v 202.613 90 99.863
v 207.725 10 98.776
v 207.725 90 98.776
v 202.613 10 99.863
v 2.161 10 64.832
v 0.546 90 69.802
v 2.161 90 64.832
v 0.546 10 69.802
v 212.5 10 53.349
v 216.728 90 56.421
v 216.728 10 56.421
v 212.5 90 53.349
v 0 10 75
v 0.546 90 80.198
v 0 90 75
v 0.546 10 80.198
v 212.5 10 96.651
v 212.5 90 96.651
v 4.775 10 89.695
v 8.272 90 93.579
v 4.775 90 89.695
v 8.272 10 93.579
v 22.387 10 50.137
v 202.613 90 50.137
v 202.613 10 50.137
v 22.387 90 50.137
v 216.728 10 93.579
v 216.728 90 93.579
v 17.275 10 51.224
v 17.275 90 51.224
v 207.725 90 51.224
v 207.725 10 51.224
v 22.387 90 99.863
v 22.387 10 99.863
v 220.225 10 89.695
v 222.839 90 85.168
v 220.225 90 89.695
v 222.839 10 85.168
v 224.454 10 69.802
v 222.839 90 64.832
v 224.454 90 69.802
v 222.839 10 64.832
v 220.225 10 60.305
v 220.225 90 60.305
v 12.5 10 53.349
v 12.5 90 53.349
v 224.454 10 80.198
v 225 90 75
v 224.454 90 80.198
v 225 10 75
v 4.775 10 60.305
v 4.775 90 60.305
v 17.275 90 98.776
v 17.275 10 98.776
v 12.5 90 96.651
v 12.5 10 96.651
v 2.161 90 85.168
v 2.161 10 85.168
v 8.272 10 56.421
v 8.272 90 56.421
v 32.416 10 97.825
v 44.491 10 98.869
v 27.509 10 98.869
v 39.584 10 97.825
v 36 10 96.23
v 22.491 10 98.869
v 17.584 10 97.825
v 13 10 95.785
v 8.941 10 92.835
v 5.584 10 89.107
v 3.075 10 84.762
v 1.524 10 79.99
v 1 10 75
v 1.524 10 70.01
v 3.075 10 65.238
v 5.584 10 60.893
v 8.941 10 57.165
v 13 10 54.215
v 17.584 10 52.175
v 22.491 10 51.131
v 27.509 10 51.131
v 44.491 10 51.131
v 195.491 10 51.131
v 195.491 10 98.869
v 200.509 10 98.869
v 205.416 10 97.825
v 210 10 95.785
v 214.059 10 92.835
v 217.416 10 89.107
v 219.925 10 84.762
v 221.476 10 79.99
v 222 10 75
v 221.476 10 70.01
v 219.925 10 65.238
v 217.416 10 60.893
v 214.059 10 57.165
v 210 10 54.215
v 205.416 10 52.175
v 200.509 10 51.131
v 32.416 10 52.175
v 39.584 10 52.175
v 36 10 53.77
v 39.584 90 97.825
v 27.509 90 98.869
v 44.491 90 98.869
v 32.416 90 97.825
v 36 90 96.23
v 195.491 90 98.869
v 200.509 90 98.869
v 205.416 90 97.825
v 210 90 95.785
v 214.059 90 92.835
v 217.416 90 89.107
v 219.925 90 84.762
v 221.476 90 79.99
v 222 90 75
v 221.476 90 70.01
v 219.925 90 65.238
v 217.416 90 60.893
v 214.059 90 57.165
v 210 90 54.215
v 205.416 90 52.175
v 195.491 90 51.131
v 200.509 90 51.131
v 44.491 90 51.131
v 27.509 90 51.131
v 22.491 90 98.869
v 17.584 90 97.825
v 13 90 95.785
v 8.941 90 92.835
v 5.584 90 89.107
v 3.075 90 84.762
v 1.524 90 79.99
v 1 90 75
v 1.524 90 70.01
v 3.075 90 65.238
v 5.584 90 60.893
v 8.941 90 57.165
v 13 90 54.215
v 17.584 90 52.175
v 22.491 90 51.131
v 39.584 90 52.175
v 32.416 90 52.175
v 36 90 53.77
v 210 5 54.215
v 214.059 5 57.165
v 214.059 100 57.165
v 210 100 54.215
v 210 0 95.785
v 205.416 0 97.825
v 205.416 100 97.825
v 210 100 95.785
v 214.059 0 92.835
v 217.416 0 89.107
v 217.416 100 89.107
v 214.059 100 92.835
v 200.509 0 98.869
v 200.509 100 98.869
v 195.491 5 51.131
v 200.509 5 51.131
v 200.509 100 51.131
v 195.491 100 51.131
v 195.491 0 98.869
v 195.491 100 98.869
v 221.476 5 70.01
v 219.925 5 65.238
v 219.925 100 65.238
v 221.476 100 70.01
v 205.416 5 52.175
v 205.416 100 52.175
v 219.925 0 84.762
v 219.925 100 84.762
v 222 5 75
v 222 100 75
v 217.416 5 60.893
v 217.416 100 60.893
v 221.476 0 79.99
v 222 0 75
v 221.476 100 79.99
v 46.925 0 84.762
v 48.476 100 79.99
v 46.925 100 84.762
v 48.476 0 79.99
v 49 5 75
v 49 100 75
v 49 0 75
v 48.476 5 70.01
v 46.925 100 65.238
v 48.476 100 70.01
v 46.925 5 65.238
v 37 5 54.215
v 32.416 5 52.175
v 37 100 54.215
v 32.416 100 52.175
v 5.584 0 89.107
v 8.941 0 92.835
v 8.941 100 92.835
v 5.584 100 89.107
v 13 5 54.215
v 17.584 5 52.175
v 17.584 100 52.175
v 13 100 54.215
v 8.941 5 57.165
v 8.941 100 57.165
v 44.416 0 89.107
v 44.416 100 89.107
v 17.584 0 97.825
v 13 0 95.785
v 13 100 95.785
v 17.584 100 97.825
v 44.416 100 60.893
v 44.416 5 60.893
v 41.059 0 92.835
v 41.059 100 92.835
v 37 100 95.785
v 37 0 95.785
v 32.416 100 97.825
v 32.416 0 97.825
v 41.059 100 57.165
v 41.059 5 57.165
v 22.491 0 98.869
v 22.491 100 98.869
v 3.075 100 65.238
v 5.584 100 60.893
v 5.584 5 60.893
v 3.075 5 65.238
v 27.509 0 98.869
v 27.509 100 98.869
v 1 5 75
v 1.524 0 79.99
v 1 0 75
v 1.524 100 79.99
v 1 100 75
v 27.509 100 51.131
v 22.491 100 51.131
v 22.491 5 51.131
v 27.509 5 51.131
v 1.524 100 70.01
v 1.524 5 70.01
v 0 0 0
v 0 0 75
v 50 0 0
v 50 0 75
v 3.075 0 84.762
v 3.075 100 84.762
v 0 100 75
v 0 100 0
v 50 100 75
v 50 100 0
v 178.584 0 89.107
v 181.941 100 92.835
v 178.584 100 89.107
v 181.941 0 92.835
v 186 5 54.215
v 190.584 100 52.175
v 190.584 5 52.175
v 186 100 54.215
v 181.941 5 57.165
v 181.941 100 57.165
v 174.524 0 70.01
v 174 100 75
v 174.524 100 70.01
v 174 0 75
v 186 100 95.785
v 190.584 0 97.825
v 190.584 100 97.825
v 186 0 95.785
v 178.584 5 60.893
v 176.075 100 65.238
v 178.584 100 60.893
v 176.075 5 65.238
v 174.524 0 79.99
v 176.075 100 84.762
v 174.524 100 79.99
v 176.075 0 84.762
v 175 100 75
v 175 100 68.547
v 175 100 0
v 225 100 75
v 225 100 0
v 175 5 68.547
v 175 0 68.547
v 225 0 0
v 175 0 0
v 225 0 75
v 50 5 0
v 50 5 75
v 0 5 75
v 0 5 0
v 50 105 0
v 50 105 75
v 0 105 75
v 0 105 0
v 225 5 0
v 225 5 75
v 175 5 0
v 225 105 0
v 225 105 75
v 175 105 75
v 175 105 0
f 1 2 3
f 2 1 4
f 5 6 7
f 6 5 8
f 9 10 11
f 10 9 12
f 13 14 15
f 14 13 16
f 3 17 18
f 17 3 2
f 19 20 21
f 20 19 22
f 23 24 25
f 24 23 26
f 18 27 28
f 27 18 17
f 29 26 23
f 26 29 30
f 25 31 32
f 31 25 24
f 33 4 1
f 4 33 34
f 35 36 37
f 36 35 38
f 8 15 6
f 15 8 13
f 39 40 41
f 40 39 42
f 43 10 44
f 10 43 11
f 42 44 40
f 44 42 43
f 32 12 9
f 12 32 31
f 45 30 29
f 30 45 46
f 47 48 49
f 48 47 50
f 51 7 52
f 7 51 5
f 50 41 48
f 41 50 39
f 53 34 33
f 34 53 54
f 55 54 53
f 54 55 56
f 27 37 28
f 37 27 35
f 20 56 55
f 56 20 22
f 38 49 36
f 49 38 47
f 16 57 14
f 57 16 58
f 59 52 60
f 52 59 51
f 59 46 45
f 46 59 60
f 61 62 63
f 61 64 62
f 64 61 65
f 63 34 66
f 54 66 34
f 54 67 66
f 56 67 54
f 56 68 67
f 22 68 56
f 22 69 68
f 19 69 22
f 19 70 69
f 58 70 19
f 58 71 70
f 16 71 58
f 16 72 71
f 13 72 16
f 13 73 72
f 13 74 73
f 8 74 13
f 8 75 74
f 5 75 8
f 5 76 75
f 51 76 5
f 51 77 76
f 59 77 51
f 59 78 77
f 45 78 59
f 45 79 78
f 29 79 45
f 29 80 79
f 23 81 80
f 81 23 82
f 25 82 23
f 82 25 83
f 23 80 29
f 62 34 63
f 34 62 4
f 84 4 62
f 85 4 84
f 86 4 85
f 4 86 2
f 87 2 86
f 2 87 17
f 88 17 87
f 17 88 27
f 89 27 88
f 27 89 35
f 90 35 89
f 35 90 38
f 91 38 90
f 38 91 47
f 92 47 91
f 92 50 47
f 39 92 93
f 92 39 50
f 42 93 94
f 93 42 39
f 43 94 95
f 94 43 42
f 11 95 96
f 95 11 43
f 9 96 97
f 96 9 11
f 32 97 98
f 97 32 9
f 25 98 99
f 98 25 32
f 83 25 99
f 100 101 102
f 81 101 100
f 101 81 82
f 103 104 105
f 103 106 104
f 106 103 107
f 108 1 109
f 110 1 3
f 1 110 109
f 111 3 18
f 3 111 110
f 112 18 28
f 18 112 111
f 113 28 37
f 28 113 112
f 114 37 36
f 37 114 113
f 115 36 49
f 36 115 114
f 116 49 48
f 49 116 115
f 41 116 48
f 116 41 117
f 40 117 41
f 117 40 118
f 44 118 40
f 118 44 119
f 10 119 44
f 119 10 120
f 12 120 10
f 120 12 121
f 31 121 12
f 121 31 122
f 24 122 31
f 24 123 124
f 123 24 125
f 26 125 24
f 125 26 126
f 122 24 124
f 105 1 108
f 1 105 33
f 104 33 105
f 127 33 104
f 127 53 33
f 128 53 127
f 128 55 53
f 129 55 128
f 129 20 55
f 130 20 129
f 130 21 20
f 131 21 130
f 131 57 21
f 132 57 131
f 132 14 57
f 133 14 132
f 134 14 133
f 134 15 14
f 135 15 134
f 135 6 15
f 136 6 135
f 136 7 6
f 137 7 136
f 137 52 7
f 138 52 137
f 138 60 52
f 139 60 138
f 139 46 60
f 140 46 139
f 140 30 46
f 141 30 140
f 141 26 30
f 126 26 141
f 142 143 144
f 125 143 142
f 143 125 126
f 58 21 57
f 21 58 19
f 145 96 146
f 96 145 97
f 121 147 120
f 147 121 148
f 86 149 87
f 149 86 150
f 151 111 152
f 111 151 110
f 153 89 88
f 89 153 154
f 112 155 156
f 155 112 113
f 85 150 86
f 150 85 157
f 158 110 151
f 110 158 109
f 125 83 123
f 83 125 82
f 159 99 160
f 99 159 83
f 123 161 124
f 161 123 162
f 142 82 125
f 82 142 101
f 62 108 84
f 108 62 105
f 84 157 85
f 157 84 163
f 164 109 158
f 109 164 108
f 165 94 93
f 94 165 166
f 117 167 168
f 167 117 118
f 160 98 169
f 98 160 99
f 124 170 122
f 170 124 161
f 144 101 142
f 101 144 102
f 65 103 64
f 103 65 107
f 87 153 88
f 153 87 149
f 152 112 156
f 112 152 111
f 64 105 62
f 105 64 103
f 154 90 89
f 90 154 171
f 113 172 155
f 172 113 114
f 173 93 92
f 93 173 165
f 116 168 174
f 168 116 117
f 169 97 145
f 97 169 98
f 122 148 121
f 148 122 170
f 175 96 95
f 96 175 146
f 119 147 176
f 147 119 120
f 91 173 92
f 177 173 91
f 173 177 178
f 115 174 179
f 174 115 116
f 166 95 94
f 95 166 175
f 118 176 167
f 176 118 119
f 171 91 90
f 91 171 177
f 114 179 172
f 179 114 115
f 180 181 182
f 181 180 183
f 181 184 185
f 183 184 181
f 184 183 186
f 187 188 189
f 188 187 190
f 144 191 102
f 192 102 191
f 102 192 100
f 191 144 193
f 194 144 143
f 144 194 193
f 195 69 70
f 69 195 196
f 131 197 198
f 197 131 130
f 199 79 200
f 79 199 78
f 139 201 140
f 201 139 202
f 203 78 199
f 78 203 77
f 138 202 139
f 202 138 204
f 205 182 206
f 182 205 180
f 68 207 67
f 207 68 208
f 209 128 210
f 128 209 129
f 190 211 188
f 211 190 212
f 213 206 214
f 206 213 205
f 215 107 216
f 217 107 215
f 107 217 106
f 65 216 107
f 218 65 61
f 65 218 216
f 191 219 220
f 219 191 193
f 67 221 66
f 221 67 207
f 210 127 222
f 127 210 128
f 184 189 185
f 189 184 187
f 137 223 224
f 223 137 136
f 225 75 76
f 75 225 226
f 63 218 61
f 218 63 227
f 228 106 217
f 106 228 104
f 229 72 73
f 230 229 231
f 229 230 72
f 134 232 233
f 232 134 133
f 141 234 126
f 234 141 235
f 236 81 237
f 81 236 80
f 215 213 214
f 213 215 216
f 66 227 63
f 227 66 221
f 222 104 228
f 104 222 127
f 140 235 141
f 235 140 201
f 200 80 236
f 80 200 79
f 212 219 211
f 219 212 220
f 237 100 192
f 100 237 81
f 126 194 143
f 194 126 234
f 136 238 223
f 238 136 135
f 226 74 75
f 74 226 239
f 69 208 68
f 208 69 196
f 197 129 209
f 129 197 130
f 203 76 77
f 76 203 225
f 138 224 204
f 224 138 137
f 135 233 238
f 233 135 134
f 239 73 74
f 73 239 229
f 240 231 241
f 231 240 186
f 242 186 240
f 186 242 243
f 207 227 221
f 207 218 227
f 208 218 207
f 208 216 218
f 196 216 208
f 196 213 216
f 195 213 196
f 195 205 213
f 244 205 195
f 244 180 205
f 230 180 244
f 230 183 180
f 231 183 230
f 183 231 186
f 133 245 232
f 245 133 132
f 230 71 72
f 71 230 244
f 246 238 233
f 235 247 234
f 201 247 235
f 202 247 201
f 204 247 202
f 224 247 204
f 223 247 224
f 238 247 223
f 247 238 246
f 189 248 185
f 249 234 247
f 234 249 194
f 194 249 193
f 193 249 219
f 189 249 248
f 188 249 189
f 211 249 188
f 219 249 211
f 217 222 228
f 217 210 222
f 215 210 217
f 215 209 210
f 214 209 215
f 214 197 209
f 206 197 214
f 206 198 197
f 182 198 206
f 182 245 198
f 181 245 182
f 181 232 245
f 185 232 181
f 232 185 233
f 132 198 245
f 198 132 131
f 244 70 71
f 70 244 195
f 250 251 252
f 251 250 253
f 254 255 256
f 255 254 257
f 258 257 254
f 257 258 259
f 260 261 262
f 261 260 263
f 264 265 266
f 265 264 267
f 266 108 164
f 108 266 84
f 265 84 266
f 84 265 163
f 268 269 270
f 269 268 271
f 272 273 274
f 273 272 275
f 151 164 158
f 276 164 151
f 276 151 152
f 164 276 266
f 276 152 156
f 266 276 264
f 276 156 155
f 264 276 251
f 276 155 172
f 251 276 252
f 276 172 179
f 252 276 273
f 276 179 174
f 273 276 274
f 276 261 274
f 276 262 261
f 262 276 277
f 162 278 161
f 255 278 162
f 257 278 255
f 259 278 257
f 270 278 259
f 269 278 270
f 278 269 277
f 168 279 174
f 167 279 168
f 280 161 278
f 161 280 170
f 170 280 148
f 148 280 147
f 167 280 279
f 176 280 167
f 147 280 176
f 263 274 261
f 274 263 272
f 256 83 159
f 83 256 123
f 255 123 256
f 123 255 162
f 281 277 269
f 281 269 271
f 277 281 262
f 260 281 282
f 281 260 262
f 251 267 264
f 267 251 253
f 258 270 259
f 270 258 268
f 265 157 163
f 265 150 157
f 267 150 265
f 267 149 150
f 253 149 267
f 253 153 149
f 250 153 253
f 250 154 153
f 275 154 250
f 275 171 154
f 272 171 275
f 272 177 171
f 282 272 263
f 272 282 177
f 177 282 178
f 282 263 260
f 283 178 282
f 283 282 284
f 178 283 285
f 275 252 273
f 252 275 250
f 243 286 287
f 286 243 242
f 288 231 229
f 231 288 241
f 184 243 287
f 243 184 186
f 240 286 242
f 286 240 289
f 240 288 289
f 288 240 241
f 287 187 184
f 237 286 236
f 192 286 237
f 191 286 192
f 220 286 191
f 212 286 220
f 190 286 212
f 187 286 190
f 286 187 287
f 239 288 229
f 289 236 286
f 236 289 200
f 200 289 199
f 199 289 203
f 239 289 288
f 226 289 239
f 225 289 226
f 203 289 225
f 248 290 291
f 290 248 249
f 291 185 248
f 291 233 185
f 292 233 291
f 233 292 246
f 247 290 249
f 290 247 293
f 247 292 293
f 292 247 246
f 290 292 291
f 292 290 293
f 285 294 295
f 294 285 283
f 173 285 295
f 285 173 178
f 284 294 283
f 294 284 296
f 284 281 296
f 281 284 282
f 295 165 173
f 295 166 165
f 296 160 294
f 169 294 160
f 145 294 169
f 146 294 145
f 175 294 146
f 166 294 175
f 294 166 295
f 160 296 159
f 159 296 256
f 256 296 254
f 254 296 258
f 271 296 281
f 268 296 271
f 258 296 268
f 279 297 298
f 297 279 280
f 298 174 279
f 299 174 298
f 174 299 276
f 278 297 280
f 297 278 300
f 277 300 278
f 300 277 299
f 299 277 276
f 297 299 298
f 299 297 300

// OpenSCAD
//

module conveyer(width, length, height){
    translate([0,width,height-50]){
      color("blue"){
        difference(){
          hull(){
            translate([25,-10,25]) rotate([90,0,0])cylinder(r=25, h = width-20);
            translate([25+length-25,-10,25]) rotate([90,0,0])cylinder(r=25, h = width-20);
          }
          hull(){
            translate([2+25+20,-10+1,25]) rotate([90,0,0])cylinder(r=24, h = width+2-20);
            translate([length-2,-10+1,25]) rotate([90,0,0])cylinder(r=24, h = width+2-20);
          }
        }
      }
      //rollers
      color("silver"){
      translate([25,0,25]) rotate([90,0,0])cylinder(r=24, h = width);
      translate([length-2,0,25]) rotate([90,0,0])cylinder(r=24, h = width);
      }
    }

    //legs
    color("silver"){
      translate([0,0,0])cube([50, 5, height-25]);
      translate([0,width,0])cube([50, 5, height-25]);
      translate([length-25,0,0])cube([50, 5, height-25]);
      translate([length-25,width,0])cube([50, 5, height-25]);
    }
}

conveyer(100, 200, 100);
